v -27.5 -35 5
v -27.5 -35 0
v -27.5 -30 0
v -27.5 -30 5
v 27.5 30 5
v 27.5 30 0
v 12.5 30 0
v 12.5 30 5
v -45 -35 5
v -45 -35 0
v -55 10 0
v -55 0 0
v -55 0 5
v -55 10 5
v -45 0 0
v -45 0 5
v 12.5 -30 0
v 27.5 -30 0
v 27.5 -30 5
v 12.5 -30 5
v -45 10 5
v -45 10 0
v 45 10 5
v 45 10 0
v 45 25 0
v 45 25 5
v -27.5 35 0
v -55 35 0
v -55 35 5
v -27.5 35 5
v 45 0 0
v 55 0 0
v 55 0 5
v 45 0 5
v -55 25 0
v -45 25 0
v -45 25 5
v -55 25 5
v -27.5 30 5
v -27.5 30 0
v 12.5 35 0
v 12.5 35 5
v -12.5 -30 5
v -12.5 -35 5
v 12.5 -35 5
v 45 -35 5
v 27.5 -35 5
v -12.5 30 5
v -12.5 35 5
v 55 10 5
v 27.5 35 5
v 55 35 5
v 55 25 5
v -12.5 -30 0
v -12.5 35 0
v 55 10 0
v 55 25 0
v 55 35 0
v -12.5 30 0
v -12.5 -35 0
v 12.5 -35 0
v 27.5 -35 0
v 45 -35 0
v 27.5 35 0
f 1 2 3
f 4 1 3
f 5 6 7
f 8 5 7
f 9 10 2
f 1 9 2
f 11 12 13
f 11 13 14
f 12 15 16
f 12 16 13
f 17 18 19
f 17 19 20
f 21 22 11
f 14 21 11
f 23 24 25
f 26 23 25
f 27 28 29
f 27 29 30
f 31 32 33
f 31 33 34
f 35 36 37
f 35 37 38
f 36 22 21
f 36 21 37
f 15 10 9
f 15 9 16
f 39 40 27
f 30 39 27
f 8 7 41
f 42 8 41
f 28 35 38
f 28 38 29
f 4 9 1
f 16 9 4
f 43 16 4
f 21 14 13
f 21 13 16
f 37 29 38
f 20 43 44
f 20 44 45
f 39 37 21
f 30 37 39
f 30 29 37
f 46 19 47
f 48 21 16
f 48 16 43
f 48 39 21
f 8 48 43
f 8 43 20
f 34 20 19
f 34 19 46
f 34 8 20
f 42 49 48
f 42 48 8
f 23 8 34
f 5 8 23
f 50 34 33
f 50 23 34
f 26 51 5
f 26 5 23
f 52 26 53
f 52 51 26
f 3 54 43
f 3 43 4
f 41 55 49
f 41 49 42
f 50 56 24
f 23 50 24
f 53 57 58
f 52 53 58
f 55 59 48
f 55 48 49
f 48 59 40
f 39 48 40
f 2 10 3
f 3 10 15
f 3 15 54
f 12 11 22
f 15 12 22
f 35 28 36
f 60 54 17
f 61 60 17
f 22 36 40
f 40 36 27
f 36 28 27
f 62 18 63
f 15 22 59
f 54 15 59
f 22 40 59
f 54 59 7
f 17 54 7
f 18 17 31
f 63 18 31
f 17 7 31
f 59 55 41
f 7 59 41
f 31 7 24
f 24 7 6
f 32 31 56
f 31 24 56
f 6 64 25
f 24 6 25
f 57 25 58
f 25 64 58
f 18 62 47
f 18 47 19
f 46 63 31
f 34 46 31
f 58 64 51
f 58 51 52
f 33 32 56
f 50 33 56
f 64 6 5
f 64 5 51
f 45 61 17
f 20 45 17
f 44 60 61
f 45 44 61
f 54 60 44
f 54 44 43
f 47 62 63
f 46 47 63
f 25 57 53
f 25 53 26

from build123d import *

# Parameters (mm, degrees)
ESQUISSE1_W             = 110
ESQUISSE1_H             = 70
BOSS_EXTRU_1_DEPTH      = 5
ESQUISSE6_W             = 10
ESQUISSE6_H             = 35
ESQUISSE6_H_2           = 15
ESQUISSE6_W_2           = 15
ESQUISSE6_H_3           = 5
ENL_V_MAT_EXTRU_2_DEPTH = 5


with BuildPart() as part:
    # Esquisse1 → Boss.-Extru.1 (new body)
    with BuildSketch(Plane.XY):
        Rectangle(ESQUISSE1_W, ESQUISSE1_H)
    extrude(amount=BOSS_EXTRU_1_DEPTH)

    # Esquisse6 → Enlèv. mat.-Extru.2 (cut)
    with BuildSketch(Plane(origin=(0, 0, 0), x_dir=(-1, 0, 0), z_dir=(0, 0, -1))):
        with Locations((-50, -17.5)):
            Rectangle(ESQUISSE6_W, ESQUISSE6_H)
        with Locations((50, -17.5)):
            Rectangle(ESQUISSE6_W, ESQUISSE6_H)
        with Locations((-50, 17.5)):
            Rectangle(ESQUISSE6_W, ESQUISSE6_H_2)
        with Locations((50, 17.5)):
            Rectangle(ESQUISSE6_W, ESQUISSE6_H_2)
        with Locations((-20, 32.5)):
            Rectangle(ESQUISSE6_W_2, ESQUISSE6_H_3)
        with Locations((20, 32.5)):
            Rectangle(ESQUISSE6_W_2, ESQUISSE6_H_3)
        with Locations((-20, -32.5)):
            Rectangle(ESQUISSE6_W_2, ESQUISSE6_H_3)
        with Locations((20, -32.5)):
            Rectangle(ESQUISSE6_W_2, ESQUISSE6_H_3)
    extrude(amount=-ENL_V_MAT_EXTRU_2_DEPTH, mode=Mode.SUBTRACT)


solid = part.part
